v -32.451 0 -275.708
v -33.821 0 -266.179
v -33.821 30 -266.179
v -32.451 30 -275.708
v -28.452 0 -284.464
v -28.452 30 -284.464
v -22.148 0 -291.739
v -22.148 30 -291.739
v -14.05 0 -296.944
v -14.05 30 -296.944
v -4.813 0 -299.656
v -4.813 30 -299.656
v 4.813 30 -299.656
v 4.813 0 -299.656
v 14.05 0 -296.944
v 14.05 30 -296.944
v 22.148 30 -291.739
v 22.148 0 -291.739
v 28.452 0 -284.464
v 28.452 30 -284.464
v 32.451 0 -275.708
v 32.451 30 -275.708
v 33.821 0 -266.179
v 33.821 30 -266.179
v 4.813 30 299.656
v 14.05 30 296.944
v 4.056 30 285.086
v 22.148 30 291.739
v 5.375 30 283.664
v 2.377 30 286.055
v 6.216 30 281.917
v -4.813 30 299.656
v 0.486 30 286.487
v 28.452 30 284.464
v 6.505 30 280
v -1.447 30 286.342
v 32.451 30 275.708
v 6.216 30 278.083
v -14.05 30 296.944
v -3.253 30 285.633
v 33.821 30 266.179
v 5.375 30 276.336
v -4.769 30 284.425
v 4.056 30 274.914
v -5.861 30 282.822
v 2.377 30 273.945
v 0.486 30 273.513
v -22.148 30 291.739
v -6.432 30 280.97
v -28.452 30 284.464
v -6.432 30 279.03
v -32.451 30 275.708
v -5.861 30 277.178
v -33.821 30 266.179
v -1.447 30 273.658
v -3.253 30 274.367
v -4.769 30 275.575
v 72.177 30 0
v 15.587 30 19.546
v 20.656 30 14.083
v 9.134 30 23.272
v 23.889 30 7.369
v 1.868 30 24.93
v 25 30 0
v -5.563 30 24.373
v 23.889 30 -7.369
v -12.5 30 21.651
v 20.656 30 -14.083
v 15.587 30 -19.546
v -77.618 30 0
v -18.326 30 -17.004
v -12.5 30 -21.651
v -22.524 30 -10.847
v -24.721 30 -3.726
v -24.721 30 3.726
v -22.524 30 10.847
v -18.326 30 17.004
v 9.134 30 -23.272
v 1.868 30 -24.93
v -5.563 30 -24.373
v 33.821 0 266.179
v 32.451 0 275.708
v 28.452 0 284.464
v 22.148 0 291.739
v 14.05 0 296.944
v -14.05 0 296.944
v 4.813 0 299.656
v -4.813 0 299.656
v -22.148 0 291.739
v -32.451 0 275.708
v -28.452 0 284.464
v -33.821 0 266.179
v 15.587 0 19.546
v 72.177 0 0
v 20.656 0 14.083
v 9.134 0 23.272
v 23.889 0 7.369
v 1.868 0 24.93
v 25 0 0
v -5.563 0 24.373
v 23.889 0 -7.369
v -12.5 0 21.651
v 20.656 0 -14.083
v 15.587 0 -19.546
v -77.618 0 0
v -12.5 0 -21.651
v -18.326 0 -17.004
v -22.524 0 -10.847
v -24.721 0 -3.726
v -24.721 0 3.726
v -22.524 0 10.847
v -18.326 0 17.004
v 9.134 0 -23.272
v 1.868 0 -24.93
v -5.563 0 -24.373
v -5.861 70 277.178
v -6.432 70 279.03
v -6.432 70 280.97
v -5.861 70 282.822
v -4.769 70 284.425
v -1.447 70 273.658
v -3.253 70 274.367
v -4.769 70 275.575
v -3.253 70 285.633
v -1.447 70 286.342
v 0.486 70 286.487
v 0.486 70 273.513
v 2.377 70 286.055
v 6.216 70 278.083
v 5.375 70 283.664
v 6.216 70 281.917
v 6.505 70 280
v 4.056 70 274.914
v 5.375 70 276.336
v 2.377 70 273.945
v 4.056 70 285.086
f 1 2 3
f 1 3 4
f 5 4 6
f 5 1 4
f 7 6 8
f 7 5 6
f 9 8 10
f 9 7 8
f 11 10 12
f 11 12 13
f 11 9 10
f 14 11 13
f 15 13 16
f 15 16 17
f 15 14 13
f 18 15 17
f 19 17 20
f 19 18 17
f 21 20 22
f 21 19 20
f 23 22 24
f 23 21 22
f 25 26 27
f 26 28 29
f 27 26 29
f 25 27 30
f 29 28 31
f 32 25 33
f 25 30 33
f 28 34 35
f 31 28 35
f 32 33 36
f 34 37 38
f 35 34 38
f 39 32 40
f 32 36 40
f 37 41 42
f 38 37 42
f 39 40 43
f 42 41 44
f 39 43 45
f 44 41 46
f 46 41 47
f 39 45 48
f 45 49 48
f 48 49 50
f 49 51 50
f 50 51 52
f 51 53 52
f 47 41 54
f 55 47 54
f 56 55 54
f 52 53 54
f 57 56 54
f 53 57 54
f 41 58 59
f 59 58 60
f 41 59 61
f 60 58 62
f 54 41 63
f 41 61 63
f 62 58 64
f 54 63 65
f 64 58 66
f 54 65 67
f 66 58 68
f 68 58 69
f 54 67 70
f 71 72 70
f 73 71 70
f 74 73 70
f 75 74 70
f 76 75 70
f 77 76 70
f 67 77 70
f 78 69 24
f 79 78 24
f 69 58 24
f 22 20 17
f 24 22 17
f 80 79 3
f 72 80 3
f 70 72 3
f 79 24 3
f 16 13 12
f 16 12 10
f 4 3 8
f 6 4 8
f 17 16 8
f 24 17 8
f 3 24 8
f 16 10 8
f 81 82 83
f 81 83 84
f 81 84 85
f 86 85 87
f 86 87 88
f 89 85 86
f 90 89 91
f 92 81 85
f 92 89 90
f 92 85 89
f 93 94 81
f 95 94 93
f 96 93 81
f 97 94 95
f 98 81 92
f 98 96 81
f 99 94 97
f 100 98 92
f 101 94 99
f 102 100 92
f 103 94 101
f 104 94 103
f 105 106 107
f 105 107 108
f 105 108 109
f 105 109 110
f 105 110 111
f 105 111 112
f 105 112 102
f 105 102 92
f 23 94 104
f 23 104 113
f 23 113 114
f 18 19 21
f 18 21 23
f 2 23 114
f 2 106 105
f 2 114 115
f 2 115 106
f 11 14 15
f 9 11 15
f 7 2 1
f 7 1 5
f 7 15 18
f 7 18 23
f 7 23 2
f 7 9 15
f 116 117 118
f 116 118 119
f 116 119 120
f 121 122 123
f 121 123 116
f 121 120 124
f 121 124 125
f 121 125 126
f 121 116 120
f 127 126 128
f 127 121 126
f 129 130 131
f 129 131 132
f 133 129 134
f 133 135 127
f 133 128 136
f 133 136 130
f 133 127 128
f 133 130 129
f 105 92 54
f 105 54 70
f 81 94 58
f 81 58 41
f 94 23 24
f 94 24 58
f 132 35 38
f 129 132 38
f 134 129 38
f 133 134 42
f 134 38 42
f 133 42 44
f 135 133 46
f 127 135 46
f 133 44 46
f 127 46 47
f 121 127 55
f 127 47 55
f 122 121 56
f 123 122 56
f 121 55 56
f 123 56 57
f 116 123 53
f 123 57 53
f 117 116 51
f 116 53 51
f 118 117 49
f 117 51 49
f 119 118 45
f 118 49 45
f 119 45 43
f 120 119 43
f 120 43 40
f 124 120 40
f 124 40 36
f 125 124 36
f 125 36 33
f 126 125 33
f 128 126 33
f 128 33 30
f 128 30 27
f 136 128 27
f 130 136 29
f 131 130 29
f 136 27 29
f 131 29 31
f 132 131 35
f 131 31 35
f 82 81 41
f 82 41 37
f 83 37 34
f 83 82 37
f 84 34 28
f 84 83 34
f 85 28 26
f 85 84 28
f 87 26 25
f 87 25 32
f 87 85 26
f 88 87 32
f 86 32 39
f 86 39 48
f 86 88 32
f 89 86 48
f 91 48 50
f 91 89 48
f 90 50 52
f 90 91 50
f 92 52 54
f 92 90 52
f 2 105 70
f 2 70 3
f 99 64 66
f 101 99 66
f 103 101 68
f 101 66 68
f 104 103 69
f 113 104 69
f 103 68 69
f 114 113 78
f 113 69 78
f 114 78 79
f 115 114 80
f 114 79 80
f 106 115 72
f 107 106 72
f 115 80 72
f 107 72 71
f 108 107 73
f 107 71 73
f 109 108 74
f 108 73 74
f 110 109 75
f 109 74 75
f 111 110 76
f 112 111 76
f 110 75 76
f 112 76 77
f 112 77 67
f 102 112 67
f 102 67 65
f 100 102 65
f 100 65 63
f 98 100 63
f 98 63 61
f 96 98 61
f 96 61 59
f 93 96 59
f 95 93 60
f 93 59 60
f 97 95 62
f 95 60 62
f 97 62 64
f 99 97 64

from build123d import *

# Parameters (mm, degrees)
BOSS_EXTRUDE1_DEPTH = 30
SKETCH2_R           = 25
CUT_EXTRUDE1_DEPTH  = 30
SKETCH3_R           = 6.505
BOSS_EXTRUDE2_DEPTH = 40


with BuildPart() as part:
    # Sketch1 → Boss-Extrude1 (new body)
    with BuildSketch(Plane(origin=(0, 0, 0), x_dir=(1, 0, 0), z_dir=(0, 1, 0))):
        with BuildLine():
            Line((-77.61802258, 0), (-33.820586084, 266.179413916))
            ThreePointArc((-33.820586084, 266.179413916), (0, 300), (33.820586084, 266.179413916))
            Line((33.820586084, 266.179413916), (72.176610565, 0))
            Line((72.176610565, 0), (33.820586084, -266.179413916))
            ThreePointArc((33.820586084, -266.179413916), (0, -300), (-33.820586084, -266.179413916))
            Line((-33.820586084, -266.179413916), (-77.61802258, 0))
        make_face()
    extrude(amount=BOSS_EXTRUDE1_DEPTH)

    # Sketch2 → Cut-Extrude1 (cut)
    with BuildSketch(Plane(origin=(0, 30, 0), x_dir=(1, 0, 0), z_dir=(0, 1, 0))):
        Circle(SKETCH2_R)
    extrude(amount=-CUT_EXTRUDE1_DEPTH, mode=Mode.SUBTRACT)

    # Sketch3 → Boss-Extrude2 (add)
    with BuildSketch(Plane(origin=(0, 30, 0), x_dir=(1, 0, 0), z_dir=(0, 1, 0))):
        with Locations((0, -280)):
            Circle(SKETCH3_R)
    extrude(amount=BOSS_EXTRUDE2_DEPTH)


solid = part.part
